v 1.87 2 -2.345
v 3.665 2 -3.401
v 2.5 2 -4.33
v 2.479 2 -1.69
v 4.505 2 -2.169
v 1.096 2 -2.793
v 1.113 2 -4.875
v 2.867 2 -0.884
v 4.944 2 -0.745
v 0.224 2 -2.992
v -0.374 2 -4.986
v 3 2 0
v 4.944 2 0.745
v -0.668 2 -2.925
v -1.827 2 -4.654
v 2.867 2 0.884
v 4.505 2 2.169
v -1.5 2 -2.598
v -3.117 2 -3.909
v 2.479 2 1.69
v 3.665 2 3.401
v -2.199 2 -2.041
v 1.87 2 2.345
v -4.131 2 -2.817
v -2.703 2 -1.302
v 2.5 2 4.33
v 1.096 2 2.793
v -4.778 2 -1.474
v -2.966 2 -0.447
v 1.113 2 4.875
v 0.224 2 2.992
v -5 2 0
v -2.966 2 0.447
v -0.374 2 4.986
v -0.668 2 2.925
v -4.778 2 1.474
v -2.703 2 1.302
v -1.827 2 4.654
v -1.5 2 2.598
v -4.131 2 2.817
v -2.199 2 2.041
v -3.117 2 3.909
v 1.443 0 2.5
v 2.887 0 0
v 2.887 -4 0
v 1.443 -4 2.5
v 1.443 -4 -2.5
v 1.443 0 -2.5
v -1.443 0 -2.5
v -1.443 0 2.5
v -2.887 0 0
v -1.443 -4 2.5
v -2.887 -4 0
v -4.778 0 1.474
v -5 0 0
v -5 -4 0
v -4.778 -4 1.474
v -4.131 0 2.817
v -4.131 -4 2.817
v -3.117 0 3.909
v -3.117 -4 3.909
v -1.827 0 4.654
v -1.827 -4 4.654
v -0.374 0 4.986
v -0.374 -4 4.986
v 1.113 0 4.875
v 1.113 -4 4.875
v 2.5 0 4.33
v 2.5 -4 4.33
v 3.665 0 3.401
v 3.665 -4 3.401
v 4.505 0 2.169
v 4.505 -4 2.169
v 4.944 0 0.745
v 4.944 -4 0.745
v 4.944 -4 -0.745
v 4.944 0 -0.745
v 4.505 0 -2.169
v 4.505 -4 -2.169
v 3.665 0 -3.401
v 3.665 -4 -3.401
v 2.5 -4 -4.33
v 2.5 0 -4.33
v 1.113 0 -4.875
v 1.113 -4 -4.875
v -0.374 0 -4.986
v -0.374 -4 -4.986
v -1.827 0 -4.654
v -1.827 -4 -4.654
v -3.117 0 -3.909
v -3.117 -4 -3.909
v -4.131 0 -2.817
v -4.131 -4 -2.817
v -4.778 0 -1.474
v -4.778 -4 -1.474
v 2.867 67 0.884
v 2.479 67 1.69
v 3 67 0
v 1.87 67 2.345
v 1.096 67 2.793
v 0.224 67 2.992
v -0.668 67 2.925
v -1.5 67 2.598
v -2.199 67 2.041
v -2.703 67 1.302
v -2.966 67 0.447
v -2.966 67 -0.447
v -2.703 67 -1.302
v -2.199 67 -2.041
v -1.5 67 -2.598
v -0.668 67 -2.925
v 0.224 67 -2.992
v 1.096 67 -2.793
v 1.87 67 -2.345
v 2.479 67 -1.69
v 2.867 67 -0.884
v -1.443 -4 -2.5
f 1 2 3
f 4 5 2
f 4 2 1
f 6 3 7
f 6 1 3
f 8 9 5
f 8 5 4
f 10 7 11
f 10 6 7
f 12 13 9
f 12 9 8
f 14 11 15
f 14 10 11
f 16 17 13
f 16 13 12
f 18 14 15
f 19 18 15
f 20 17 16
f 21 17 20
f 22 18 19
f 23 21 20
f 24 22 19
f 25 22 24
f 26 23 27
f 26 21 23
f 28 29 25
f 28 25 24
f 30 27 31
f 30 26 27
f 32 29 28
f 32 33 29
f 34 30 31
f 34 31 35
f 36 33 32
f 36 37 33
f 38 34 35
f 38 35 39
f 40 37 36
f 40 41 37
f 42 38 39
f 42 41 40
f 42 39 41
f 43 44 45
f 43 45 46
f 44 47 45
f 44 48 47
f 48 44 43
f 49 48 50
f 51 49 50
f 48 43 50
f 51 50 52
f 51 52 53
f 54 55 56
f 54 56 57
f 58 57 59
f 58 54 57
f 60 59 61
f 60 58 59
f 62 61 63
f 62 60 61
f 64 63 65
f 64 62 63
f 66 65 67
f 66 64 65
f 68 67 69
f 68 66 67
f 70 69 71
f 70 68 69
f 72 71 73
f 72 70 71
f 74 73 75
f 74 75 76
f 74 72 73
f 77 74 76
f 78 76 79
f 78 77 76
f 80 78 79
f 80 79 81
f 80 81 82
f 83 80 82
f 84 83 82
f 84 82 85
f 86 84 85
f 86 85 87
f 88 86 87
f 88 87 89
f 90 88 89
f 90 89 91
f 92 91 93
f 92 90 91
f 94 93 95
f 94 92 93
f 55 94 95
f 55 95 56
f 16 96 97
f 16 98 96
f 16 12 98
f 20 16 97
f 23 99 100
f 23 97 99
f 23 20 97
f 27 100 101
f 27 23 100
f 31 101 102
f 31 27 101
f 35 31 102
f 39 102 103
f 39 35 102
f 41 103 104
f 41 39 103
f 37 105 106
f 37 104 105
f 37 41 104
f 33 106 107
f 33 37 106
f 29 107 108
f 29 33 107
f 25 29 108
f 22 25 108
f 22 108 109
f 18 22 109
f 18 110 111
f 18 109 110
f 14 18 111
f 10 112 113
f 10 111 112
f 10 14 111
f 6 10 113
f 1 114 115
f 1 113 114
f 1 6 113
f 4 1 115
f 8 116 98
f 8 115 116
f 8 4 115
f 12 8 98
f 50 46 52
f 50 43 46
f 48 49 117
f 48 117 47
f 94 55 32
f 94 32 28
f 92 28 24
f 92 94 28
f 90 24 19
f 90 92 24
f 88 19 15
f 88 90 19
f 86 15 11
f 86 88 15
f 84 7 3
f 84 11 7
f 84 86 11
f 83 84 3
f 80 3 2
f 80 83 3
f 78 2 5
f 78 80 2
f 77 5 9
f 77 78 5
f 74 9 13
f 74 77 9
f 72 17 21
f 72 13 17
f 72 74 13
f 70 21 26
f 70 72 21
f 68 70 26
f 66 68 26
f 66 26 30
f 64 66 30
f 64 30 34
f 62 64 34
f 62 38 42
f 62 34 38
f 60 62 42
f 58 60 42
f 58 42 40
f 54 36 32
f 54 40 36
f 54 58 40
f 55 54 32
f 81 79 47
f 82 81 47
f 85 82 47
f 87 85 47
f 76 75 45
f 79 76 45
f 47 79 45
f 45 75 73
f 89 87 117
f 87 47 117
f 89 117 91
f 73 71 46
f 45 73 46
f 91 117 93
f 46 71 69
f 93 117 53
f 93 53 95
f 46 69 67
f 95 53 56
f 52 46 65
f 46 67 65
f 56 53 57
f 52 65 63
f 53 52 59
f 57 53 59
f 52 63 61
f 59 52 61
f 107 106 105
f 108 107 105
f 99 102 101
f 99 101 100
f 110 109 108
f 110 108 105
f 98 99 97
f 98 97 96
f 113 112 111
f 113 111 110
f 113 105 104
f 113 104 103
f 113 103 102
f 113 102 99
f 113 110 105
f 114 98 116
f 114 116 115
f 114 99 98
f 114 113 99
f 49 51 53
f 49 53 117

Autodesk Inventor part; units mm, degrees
ref_plane "YZ Plane" through (0, 0, 0) normal (1, 0, 0) x (0, 1, 0)
ref_plane "XZ Plane" through (0, 0, 0) normal (0, 1, 0) x (-1, 0, 0)
ref_plane "XY Plane" through (0, 0, 0) normal (0, 0, 1) x (1, 0, 0)
sketch "Szkic1" plane through (0, 0, 0) normal (0, 1, 0) x (-1, 0, 0)
  circle A0 centre (0, 0) radius 5
  line L0 (1.4434, 2.5) -> (2.8868, 0)
  line L1 (2.8868, 0) -> (1.4434, -2.5)
  line L2 (1.4434, -2.5) -> (-1.4434, -2.5)
  line L3 (-1.4434, -2.5) -> (-2.8868, 0)
  line L4 (-2.8868, 0) -> (-1.4434, 2.5)
  line L5 (-1.4434, 2.5) -> (1.4434, 2.5)
  circle A1 centre (0, 0) radius 3
  dimension "d0" = 10
  dimension "d1" = 5
  dimension "d2" = 6
extrude "Wyciągnięcie proste1" add sketch "Szkic1" along normal blind 2 contours A0 | L0 L1 L2 L3 L4 L5 | A1
extrude "Wyciągnięcie proste2" add sketch "Szkic1" against normal blind 4 contours A0 | A1
sketch "Szkic2" plane through (0, 2, 0) normal (0, 1, 0) x (1, 0, 0)
  circle A0 centre (0, 0) radius 3
  dimension "d7" = 6
extrude "Wyciągnięcie proste3" add sketch "Szkic2" along normal blind 65
thread "Gwint1" size "M6x1" class "6g" standard "ANSI Metric M Profile" length 65
properties part number "M6x65"
